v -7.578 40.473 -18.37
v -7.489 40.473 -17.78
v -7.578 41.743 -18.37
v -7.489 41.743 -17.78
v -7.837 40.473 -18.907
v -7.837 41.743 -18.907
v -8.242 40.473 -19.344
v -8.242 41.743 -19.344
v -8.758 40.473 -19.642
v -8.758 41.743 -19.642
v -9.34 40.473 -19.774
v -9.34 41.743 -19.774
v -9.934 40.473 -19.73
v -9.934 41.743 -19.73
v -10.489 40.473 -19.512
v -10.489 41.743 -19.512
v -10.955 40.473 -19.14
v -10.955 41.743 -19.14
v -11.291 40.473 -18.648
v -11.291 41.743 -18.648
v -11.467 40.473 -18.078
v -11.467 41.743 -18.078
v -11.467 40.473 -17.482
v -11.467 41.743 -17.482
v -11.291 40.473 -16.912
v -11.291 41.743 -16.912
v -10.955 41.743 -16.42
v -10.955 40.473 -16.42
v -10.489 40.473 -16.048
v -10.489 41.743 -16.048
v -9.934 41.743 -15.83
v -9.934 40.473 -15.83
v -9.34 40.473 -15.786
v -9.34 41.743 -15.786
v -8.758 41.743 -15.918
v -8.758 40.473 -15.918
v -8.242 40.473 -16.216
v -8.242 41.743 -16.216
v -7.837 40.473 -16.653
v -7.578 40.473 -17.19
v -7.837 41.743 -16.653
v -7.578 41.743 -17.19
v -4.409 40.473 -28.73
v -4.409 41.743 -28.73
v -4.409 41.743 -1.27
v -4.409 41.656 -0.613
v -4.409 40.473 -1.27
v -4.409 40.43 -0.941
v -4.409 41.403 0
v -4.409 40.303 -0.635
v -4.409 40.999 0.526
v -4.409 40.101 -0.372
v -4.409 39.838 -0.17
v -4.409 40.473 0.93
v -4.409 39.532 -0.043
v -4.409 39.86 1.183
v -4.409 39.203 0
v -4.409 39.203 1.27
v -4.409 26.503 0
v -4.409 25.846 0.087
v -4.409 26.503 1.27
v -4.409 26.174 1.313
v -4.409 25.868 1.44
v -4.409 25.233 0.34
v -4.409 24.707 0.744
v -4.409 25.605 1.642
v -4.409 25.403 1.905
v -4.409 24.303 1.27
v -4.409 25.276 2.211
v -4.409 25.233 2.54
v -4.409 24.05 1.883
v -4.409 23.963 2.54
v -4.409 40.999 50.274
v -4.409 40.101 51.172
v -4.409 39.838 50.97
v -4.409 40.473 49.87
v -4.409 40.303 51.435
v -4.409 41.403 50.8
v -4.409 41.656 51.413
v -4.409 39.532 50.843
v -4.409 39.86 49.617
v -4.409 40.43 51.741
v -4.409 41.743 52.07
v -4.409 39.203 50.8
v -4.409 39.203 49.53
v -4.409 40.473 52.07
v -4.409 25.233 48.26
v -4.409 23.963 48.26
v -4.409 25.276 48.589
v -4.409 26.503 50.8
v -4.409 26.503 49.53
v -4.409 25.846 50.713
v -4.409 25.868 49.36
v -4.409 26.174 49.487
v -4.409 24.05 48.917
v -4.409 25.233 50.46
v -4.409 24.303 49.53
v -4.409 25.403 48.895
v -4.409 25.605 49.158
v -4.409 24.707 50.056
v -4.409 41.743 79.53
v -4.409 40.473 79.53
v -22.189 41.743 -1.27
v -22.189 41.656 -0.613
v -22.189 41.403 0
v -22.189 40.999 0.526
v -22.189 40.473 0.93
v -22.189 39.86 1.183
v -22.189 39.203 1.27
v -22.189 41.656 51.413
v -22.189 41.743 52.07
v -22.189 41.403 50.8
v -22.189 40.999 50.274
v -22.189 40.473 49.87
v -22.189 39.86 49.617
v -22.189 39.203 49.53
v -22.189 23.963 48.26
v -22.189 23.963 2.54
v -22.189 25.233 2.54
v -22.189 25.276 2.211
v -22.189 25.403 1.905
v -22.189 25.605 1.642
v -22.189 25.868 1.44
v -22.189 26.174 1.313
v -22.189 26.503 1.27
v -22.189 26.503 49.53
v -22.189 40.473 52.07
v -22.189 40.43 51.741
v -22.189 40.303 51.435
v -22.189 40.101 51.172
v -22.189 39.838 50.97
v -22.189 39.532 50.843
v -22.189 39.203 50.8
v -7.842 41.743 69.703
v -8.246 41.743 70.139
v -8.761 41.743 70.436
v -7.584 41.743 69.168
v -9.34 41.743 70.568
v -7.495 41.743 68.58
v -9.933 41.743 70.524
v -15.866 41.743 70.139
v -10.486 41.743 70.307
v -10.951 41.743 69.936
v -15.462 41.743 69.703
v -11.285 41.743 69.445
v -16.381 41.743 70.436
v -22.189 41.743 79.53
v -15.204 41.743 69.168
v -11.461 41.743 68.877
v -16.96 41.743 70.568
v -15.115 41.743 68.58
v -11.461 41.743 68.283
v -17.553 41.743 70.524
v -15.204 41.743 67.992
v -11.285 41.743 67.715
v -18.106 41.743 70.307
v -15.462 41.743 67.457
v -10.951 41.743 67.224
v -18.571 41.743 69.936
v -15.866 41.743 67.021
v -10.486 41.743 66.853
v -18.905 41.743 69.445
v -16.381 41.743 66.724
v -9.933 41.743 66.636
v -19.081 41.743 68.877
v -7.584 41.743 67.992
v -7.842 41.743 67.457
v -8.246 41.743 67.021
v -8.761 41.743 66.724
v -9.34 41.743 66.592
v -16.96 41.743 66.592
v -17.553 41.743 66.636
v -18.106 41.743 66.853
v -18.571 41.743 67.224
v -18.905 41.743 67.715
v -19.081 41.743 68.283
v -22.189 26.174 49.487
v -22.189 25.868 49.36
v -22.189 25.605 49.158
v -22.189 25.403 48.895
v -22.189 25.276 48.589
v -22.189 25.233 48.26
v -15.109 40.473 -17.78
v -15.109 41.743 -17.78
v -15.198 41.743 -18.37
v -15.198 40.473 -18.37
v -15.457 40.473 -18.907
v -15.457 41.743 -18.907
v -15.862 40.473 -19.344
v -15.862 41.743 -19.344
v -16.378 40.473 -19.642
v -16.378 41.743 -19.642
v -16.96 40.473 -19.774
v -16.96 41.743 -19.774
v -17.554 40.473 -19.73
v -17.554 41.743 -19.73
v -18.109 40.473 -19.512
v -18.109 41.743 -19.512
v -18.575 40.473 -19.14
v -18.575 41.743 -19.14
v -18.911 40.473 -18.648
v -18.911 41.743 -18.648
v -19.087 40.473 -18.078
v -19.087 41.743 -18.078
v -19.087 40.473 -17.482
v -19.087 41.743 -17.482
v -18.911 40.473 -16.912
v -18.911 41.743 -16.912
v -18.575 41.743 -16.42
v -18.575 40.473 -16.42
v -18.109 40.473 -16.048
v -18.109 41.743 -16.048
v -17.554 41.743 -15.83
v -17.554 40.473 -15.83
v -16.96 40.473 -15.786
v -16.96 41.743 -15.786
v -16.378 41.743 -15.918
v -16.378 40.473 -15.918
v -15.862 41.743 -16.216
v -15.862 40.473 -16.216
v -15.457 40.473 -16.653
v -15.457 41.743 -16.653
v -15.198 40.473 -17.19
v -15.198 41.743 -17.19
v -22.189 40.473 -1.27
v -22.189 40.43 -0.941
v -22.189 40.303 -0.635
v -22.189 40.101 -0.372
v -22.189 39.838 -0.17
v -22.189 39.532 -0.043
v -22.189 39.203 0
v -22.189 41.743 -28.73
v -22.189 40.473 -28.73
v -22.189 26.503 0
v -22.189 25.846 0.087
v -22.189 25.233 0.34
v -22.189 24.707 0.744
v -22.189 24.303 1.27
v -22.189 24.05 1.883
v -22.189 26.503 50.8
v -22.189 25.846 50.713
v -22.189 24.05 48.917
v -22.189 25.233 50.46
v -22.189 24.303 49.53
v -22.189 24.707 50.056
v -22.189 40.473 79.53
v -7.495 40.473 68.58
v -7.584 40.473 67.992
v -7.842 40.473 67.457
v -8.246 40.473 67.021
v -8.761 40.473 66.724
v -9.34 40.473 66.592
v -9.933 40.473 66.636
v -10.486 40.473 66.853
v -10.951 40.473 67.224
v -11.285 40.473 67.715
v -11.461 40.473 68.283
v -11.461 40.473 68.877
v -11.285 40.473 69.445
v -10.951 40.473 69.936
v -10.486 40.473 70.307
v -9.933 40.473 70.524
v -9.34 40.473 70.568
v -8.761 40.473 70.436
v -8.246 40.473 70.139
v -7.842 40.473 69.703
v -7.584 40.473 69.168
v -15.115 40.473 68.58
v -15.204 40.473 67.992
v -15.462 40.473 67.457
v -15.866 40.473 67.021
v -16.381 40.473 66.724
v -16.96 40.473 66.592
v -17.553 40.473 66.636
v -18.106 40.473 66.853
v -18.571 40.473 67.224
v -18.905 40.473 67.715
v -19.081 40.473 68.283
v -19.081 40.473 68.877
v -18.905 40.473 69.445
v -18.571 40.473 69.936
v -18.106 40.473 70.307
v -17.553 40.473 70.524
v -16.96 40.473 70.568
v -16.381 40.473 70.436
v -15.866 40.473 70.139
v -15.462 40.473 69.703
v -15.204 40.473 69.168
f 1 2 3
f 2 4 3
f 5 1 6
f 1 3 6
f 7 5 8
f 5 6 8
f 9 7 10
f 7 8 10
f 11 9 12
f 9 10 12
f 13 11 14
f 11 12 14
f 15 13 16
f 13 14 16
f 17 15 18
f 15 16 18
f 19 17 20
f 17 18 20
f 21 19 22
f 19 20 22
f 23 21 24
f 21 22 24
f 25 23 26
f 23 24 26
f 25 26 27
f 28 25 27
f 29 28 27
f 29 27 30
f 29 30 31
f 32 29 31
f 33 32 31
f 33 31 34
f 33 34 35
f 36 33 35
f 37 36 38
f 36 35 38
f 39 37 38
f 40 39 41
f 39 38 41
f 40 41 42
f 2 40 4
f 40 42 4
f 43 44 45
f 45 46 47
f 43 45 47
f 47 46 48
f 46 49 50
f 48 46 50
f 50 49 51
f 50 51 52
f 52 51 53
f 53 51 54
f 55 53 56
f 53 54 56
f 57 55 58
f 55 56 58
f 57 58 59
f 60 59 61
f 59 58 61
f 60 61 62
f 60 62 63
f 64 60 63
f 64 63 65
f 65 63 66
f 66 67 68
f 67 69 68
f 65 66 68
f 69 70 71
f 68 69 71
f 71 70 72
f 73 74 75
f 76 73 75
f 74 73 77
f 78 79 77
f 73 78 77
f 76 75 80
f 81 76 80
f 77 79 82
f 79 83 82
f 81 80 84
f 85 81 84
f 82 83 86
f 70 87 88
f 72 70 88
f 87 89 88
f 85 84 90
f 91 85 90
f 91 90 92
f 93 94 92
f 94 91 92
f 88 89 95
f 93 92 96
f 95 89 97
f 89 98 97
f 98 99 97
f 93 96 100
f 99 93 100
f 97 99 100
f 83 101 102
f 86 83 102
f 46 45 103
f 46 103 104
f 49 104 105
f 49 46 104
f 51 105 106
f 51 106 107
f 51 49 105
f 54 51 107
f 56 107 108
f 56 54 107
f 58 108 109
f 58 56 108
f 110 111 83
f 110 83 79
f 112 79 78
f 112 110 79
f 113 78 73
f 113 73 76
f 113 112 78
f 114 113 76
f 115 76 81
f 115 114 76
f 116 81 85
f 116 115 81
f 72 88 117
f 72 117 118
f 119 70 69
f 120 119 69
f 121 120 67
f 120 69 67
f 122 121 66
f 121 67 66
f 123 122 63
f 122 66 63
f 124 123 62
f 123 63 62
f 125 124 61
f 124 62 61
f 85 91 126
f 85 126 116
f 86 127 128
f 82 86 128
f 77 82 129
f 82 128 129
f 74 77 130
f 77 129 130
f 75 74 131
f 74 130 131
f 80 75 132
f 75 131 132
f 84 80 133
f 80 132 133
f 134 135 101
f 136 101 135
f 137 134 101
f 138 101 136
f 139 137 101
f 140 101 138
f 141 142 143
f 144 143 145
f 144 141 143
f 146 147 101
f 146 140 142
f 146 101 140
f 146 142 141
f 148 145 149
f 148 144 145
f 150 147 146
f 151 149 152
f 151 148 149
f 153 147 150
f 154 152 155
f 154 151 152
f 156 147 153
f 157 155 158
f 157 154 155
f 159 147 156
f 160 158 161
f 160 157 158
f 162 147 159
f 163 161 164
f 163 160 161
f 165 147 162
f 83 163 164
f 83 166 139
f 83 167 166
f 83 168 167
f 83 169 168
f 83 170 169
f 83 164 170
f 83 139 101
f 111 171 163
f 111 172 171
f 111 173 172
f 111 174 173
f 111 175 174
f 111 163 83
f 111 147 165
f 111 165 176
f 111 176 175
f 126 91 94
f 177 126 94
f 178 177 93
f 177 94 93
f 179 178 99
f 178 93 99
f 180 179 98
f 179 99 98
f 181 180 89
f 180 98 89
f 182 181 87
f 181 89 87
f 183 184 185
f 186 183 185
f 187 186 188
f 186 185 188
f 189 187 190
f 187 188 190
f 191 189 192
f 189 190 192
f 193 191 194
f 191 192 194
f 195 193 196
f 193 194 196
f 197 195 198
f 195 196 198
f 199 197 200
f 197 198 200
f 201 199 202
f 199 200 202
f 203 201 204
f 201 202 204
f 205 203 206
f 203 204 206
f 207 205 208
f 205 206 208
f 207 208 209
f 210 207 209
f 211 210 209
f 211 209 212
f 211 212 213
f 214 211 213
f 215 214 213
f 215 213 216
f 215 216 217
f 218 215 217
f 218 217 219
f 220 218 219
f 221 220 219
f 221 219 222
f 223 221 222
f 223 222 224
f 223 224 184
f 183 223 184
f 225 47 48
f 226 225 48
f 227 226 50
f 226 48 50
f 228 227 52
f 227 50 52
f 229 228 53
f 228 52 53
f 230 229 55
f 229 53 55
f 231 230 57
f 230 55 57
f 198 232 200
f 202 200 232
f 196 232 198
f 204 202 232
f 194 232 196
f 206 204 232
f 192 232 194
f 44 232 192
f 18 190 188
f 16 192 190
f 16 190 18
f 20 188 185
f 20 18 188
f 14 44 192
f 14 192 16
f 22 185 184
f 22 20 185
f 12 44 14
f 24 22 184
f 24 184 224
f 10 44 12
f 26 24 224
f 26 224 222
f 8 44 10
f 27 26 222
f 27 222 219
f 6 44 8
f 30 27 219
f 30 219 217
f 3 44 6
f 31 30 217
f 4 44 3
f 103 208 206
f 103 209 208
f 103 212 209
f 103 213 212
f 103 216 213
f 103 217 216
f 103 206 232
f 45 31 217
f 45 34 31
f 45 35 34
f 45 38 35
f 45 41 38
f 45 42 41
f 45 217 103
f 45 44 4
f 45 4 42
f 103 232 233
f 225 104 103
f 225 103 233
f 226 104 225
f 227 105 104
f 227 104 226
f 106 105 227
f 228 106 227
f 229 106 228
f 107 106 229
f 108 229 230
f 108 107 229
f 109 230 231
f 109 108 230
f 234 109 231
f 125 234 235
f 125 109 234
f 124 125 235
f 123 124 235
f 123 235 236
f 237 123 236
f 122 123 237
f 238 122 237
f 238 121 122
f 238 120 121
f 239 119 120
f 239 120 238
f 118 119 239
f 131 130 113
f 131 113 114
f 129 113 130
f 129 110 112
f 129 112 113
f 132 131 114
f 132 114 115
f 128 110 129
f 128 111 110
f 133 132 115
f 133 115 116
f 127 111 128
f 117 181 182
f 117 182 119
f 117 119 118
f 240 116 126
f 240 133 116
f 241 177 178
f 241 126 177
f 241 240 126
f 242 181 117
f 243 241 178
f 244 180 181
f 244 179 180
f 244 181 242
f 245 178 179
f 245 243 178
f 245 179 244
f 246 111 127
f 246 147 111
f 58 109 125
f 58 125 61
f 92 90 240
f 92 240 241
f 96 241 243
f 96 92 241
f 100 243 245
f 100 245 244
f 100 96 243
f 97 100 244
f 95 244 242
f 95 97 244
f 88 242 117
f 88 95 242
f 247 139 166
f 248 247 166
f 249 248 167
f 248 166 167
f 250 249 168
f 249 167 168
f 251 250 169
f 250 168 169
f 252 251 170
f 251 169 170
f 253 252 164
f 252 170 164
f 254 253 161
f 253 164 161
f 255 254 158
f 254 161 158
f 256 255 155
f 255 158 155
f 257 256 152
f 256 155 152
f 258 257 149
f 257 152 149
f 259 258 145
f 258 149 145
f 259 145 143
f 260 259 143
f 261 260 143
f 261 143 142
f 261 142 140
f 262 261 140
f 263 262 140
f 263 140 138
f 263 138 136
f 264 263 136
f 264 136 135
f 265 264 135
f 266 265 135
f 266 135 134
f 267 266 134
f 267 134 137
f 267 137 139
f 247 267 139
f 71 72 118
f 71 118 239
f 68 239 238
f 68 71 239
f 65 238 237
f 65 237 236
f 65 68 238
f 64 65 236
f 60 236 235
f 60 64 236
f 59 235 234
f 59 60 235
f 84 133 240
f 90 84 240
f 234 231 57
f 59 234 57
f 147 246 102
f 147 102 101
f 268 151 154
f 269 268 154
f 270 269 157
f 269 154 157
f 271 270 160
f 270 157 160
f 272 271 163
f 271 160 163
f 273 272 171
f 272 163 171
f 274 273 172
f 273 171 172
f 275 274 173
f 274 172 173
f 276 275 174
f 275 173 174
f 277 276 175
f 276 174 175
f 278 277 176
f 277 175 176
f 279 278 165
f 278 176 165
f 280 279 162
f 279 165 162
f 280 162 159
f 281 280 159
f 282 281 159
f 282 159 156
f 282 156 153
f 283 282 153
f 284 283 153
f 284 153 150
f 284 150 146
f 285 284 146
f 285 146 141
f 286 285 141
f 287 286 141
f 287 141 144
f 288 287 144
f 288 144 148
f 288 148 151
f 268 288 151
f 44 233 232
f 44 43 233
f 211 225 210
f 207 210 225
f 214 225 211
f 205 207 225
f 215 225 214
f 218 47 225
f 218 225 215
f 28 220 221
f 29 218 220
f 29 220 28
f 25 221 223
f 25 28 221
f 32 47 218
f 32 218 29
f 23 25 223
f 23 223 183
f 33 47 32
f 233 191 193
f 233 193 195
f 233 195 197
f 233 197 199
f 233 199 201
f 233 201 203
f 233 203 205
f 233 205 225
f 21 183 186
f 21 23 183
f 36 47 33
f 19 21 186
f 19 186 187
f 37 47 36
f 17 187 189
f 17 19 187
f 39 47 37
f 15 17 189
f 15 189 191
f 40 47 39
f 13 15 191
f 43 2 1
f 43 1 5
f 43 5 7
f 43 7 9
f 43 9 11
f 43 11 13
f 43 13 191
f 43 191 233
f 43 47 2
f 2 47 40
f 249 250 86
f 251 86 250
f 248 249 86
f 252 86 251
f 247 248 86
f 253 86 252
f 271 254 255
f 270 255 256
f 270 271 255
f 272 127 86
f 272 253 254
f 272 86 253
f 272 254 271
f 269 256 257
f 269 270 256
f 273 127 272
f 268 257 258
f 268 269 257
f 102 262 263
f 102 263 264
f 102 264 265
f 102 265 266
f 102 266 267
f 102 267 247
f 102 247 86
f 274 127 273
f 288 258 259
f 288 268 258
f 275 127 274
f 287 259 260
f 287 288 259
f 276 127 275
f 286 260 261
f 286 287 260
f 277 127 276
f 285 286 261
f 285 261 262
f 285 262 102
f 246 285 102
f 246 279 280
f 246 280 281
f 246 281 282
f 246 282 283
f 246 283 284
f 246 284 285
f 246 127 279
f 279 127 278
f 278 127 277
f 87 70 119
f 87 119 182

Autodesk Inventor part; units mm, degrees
ref_plane "YZ Plane" through (0, 0, 0) normal (1, 0, 0) x (0, 1, 0)
ref_plane "XZ Plane" through (0, 0, 0) normal (0, 1, 0) x (-1, 0, 0)
ref_plane "XY Plane" through (0, 0, 0) normal (0, 0, 1) x (1, 0, 0)
sketch "Sketch1" plane through (0, 0, 0) normal (0, 0, 1) x (1, 0, 0)
  line L0 (-22.189, 41.743) -> (-4.409, 41.743)
  line L1 (-4.409, 41.743) -> (-4.409, 23.963)
  line L2 (-4.409, 23.963) -> (-22.189, 23.963)
  line L3 (-22.189, 23.963) -> (-22.189, 41.743)
  point P0 (0, 0)
  dimension "d0" = 17.78
  dimension "d1" = 17.78
extrude "Plate1" add sketch "Sketch1" along normal blind 1.27
sketch "Sketch2" plane through (-4.409, 40.473, 1.27) normal (0, 1, 0) x (-1, 0, 0)
  line L0 (17.78, 0) -> (0, 0)
  line L1 (0, 0) -> (0, -30)
  line L2 (0, -30) -> (17.78, -30)
  line L3 (17.78, -30) -> (17.78, 0)
edge flange "Flange1" height 30 angle 90 thickness 1.27 bend radius 1.27 thickness toward (0, 1, 0) relief straight relief width 1.27 relief depth 0.635 edges at (-13.299, 41.743, 0) wall of the first edge with corners at (-22.189, 40.473, 1.27) (-4.409, 40.473, 1.27) (-4.409, 40.473, -28.73) (-22.189, 40.473, -28.73)
bend "Bend1"
corner "Corner1"
sketch "Sketch4" plane through (-22.189, 41.743, -28.73) normal (0, 1, 0) x (1, 0, 0)
  circle A0 centre (12.7, -10.95) radius 2
  circle A1 centre (5.08, -10.95) radius 2
  line L0 (17.78, 0) -> (17.78, -27.46) projected
  line L1 (0, -27.46) -> (0, 0) projected
  line L2 (0, -27.46) -> (17.78, -27.46) projected
  point P0 (22.189, -28.73)
  dimension "d26" = 4
  dimension "d27" = 4
  dimension "d29" = 5.08
  dimension "d30" = 5.08
  dimension "d31" = 16.51
  dimension "d32" = 16.51
extrude "Extrusion2" cut sketch "Sketch4" against normal blind 2.54
sketch "Sketch5" plane through (-4.409, 25.233, 0) normal (0, -1, 0) x (1, 0, 0)
  line L0 (-17.78, 0) -> (0, 0)
  line L1 (0, 0) -> (0, 50.8)
  line L2 (0, 50.8) -> (-17.78, 50.8)
  line L3 (-17.78, 50.8) -> (-17.78, 0)
edge flange "Flange2" height 50.8 angle 90 thickness 1.27 bend radius 1.27 thickness toward (0, -1, 0) relief straight relief width 1.27 relief depth 0.635 edges at (-13.299, 23.963, 1.27) wall of the first edge with corners at (-22.189, 25.233, 0) (-4.409, 25.233, 0) (-4.409, 25.233, 50.8) (-22.189, 25.233, 50.8)
bend "Bend2"
corner "Corner2"
sketch "Sketch6" plane through (-4.409, 23.963, 49.53) normal (0, 0, 1) x (1, 0, 0)
  line L0 (-17.78, 0) -> (0, 0)
  line L1 (0, 0) -> (0, 15.24)
  line L2 (0, 15.24) -> (-17.78, 15.24)
  line L3 (-17.78, 15.24) -> (-17.78, 0)
edge flange "Flange3" height 15.24 angle 90 thickness 1.27 bend radius 1.27 thickness toward (0, 0, 1) relief straight relief width 1.27 relief depth 0.635 edges at (-13.299, 25.233, 50.8) wall of the first edge with corners at (-22.189, 23.963, 49.53) (-4.409, 23.963, 49.53) (-4.409, 39.203, 49.53) (-22.189, 39.203, 49.53)
bend "Bend3"
corner "Corner3"
sketch "Sketch7" plane through (-22.189, 40.473, 52.07) normal (0, 1, 0) x (-1, 0, 0)
  line L0 (-17.78, 0) -> (0, 0)
  line L1 (0, 0) -> (0, 27.46)
  line L2 (0, 27.46) -> (-17.78, 27.46)
  line L3 (-17.78, 27.46) -> (-17.78, 0)
edge flange "Flange4" height 30 angle 90 thickness 1.27 bend radius 1.27 thickness toward (0, 1, 0) relief straight relief width 1.27 relief depth 0.635 edges at (-13.299, 39.203, 50.8) wall of the first edge with corners at (-4.409, 40.473, 52.07) (-22.189, 40.473, 52.07) (-22.189, 40.473, 79.53) (-4.409, 40.473, 79.53)
bend "Bend4"
corner "Corner4"
sketch "Sketch9" plane through (-22.189, 41.743, 79.53) normal (0, 1, 0) x (1, 0, 0)
  circle A0 centre (5.08, 10.95) radius 1.9939
  circle A1 centre (12.7, 10.95) radius 1.9939
  line L0 (0, 0) -> (0, 27.46) projected
  line L1 (17.78, 27.46) -> (17.78, 0) projected
  point P0 (22.189, 79.53)
  dimension "d69" = 3.9878
  dimension "d70" = 3.9878
  dimension "d71" = 5.08
  dimension "d73" = 16.51
  dimension "d74" = 16.51
  dimension "d79" = 7.62
extrude "Extrusion4" cut sketch "Sketch9" against normal blind 5.08
sketch "Sketch10" plane through (-22.189, 25.233, 2.54) normal (0, 1, 0) x (1, 0, 0)
  point P0 (22.189, 2.54)
equation "\"d3\" = BendReliefWidth"
equation "\"d4\" = BendReliefDepth"
equation "\"d5\" = MinimumRemnant"
equation "\"d6\" = BendRadius"
equation "\"d9\" = BendRadius"
equation "\"d10\" = CornerReliefSize"
equation "\"d11\" = GapSize"
equation "\"d12\" = JacobiRadiusSize"
equation "\"d35\" = BendReliefWidth"
equation "\"d36\" = BendReliefDepth"
equation "\"d37\" = MinimumRemnant"
equation "\"d38\" = BendRadius"
equation "\"d41\" = BendRadius"
equation "\"d42\" = CornerReliefSize"
equation "\"d43\" = GapSize"
equation "\"d44\" = JacobiRadiusSize"
equation "\"d45\" = BendReliefWidth"
equation "\"d46\" = BendReliefDepth"
equation "\"d47\" = MinimumRemnant"
equation "\"d48\" = BendRadius"
equation "\"d51\" = BendRadius"
equation "\"d52\" = CornerReliefSize"
equation "\"d53\" = GapSize"
equation "\"d54\" = JacobiRadiusSize"
equation "\"d55\" = BendReliefWidth"
equation "\"d56\" = BendReliefDepth"
equation "\"d57\" = MinimumRemnant"
equation "\"d58\" = BendRadius"
equation "\"d61\" = BendRadius"
equation "\"d62\" = CornerReliefSize"
equation "\"d63\" = GapSize"
equation "\"d64\" = JacobiRadiusSize"
equation "\"BendRadius\" = Thickness"
equation "\"BendReliefWidth\" = Thickness"
equation "\"BendReliefDepth\" = 0.5 * Thickness"
equation "\"CornerReliefSize\" = 4 * Thickness"
equation "\"MinimumRemnant\" = 2 * Thickness"
equation "\"TransitionRadius\" = BendRadius"
equation "\"JacobiRadiusSize\" = Thickness"
equation "\"GapSize\" = Thickness"
equation "\"d2\" = BendRadius"
equation "\"Thickness\" = 1.27"
properties part number "Hew battery holder"
